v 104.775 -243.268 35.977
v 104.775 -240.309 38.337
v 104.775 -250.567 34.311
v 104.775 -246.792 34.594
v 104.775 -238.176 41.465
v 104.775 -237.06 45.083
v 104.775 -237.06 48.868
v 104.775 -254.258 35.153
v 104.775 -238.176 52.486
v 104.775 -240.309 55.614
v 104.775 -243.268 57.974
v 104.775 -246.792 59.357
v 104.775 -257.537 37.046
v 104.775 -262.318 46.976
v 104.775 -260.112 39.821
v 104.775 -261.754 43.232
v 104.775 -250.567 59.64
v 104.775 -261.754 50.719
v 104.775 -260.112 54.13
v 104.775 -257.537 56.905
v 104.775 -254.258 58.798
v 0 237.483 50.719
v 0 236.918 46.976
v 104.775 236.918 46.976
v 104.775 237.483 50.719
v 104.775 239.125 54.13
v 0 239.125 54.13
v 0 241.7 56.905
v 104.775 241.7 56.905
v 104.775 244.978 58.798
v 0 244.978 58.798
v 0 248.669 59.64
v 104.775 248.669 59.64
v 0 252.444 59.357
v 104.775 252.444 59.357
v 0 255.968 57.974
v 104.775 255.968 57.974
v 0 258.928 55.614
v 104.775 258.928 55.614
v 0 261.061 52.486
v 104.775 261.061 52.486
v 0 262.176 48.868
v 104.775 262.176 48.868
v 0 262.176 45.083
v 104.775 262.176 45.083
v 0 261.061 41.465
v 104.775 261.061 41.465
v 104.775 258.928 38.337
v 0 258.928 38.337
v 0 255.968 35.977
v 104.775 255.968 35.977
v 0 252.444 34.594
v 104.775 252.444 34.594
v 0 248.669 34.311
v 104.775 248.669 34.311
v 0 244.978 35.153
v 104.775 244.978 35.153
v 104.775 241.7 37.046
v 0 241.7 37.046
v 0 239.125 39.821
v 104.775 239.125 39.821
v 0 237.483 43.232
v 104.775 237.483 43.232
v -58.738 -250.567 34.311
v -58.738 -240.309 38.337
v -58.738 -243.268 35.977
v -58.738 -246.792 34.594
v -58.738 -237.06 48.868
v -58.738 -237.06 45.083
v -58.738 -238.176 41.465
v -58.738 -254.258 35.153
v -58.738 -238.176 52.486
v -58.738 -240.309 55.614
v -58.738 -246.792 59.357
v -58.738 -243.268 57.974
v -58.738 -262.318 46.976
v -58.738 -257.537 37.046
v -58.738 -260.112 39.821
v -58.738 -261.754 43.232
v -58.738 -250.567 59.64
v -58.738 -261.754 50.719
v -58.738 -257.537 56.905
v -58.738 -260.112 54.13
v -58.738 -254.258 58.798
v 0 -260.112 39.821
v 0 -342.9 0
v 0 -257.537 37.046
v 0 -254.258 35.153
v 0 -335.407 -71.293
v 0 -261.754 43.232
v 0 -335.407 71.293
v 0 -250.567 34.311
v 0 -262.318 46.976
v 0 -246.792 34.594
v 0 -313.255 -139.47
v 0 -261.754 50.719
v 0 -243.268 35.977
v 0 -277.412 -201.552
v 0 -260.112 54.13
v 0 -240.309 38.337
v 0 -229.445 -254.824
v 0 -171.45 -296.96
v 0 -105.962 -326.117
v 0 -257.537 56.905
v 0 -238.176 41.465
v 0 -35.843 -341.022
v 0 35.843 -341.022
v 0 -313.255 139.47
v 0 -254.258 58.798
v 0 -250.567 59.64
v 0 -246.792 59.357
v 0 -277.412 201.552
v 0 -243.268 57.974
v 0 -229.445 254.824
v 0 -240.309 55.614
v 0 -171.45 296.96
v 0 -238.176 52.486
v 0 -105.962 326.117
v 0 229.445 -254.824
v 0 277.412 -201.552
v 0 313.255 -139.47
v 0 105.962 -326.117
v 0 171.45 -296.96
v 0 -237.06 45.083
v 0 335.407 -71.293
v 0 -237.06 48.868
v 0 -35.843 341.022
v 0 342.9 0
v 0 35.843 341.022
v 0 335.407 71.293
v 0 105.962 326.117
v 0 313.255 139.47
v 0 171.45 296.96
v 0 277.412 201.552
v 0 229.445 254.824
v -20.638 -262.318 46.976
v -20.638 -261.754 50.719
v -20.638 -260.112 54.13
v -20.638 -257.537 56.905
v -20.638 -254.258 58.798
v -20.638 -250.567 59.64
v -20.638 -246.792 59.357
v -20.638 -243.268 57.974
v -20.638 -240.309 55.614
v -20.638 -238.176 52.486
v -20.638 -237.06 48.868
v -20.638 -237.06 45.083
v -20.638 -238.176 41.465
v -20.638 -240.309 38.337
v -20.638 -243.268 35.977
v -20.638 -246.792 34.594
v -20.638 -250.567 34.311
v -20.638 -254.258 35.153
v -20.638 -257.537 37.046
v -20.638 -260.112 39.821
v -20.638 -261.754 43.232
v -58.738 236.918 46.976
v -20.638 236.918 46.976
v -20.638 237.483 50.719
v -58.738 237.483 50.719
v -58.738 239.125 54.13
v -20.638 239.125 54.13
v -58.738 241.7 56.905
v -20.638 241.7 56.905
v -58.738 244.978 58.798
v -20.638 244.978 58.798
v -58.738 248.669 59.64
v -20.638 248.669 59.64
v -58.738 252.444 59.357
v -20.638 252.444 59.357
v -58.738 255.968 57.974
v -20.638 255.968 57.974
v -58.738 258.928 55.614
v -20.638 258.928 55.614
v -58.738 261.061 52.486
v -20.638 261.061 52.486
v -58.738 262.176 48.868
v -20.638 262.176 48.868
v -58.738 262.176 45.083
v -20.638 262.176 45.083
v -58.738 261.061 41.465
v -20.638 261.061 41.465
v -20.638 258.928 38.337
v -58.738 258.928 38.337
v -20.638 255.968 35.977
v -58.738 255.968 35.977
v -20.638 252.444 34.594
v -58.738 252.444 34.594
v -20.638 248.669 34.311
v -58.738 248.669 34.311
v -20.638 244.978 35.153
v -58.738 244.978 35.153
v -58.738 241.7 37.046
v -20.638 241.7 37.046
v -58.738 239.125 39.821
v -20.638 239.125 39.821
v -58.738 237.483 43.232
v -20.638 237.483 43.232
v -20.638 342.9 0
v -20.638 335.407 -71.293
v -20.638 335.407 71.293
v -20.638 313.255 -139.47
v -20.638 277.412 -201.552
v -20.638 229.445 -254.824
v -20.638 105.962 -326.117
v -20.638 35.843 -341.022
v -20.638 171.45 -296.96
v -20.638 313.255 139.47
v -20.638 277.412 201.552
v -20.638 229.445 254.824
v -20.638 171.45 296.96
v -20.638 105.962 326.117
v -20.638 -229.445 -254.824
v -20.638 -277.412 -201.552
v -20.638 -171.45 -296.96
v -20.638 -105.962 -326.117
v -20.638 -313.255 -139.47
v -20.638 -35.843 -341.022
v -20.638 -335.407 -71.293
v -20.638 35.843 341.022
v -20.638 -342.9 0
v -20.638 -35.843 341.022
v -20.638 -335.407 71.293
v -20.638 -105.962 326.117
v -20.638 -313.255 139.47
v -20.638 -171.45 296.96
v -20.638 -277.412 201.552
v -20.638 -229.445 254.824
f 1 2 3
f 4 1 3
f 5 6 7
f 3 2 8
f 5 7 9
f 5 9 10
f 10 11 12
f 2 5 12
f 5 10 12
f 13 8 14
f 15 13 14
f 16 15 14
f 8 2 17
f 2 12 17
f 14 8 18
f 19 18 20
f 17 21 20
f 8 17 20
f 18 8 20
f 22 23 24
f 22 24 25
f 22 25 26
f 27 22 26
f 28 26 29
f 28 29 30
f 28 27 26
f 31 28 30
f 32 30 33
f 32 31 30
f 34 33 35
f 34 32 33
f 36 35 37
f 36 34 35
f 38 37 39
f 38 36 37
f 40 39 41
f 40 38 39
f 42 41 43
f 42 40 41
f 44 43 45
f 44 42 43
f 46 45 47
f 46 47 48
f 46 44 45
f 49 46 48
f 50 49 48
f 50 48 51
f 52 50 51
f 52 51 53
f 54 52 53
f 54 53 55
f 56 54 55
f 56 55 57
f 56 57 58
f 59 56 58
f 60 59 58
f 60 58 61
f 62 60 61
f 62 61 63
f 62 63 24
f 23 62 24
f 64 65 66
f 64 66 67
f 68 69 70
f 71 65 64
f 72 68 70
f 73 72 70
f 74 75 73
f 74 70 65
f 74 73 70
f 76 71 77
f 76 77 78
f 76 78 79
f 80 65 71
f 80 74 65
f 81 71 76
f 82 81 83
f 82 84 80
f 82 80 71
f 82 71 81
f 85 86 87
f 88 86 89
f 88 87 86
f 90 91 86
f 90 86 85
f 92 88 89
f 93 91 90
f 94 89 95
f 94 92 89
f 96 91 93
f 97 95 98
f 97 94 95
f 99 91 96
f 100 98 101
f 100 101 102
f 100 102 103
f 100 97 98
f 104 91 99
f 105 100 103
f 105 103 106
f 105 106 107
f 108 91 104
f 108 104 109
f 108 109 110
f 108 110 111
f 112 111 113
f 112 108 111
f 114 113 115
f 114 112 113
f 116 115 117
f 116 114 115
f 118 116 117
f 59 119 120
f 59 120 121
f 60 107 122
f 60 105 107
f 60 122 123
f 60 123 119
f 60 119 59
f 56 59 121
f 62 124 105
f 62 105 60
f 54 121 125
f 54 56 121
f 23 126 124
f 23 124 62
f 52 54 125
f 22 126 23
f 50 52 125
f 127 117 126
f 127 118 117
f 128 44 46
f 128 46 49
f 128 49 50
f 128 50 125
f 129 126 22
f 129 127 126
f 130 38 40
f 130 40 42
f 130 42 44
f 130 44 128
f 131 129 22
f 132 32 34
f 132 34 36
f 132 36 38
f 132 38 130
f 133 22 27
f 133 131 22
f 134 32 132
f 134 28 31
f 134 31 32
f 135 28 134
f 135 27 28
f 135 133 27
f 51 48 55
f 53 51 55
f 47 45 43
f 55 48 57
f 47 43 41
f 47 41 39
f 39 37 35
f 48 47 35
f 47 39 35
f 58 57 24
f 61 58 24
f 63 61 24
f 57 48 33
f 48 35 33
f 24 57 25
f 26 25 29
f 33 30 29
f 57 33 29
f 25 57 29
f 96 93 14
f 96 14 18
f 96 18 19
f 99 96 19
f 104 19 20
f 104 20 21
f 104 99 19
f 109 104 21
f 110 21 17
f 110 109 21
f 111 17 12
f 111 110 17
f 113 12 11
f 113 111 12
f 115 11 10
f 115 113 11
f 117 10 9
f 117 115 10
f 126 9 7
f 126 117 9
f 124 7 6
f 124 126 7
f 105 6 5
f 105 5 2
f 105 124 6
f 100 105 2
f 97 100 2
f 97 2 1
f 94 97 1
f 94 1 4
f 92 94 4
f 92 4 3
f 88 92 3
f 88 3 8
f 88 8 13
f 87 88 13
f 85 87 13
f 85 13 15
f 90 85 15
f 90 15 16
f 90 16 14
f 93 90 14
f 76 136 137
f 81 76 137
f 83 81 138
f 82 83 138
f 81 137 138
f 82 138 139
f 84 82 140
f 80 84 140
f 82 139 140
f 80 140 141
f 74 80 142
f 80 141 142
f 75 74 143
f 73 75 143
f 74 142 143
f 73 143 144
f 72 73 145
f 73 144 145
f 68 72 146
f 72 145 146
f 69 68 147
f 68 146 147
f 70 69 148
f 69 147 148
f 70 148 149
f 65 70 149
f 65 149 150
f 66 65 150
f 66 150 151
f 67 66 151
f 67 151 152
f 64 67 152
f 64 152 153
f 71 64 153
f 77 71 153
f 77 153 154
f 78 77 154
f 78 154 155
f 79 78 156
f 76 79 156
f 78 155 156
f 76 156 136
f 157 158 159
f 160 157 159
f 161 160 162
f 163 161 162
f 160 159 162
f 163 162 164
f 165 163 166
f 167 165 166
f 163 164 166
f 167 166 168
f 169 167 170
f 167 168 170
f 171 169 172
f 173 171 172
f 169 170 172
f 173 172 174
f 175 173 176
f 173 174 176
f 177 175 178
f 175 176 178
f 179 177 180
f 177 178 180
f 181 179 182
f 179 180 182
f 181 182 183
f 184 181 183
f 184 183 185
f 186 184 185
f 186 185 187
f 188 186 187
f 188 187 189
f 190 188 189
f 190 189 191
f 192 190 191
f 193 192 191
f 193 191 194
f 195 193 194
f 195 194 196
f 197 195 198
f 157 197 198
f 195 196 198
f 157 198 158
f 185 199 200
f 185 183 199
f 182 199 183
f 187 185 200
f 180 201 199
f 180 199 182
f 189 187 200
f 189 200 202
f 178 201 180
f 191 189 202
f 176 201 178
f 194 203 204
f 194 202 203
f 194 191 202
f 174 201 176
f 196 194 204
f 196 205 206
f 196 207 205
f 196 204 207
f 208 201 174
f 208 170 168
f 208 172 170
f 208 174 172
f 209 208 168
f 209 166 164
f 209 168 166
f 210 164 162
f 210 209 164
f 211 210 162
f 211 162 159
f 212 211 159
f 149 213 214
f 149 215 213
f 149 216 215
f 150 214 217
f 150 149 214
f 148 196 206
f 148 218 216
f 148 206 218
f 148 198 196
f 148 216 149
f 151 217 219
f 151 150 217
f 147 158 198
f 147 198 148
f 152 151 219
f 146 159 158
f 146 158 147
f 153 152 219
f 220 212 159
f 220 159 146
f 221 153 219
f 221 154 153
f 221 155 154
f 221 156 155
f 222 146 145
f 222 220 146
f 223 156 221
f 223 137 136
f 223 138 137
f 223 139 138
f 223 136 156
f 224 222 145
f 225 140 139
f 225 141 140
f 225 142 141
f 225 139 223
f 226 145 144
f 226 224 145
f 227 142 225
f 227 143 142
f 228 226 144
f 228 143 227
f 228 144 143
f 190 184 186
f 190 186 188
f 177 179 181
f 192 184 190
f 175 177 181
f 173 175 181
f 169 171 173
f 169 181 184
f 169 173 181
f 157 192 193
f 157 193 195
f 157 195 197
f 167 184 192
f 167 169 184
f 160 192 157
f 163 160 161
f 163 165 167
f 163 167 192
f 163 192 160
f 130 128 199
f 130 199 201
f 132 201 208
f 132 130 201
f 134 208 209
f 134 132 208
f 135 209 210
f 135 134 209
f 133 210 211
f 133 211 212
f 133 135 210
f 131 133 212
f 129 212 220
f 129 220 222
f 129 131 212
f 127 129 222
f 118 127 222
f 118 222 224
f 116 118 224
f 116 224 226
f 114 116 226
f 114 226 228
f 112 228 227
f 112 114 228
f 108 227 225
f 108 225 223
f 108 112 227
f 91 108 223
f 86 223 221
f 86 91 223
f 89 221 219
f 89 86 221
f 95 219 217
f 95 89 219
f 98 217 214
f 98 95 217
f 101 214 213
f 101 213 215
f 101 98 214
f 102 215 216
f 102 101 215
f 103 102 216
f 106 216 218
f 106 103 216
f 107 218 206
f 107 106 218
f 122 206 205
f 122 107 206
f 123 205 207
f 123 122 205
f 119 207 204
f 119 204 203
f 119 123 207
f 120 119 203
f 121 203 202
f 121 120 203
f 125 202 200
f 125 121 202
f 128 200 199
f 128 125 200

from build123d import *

# Parameters (mm, degrees)
F0_R     = 342.9
F1_DEPTH = 20.6375
F2_R     = 12.7
F3_DEPTH = 125.4125
F4_DEPTH = 38.1


with BuildPart() as f1:
    # F0 (on Right) → F1 (new body)
    with BuildSketch(Plane.YZ):
        Circle(F0_R)
    extrude(amount=-F1_DEPTH)

    # F2 (on face) → F3 (join)
    with BuildSketch(Plane(origin=(-20.6375, 0, 0), x_dir=(0, -1, 0), z_dir=(-1, 0, 0))):
        with Locations((249.618309, 46.975525)):
            Circle(F2_R)
        with Locations((-249.618309, 46.975525)):
            Circle(F2_R)
    extrude(amount=-F3_DEPTH)

    # F2 (on face) → F4 (join)
    with BuildSketch(Plane(origin=(-20.6375, 0, 0), x_dir=(0, -1, 0), z_dir=(-1, 0, 0))):
        with Locations((249.618309, 46.975525)):
            Circle(F2_R)
        with Locations((-249.618309, 46.975525)):
            Circle(F2_R)
    extrude(amount=F4_DEPTH)


solid = f1.part
